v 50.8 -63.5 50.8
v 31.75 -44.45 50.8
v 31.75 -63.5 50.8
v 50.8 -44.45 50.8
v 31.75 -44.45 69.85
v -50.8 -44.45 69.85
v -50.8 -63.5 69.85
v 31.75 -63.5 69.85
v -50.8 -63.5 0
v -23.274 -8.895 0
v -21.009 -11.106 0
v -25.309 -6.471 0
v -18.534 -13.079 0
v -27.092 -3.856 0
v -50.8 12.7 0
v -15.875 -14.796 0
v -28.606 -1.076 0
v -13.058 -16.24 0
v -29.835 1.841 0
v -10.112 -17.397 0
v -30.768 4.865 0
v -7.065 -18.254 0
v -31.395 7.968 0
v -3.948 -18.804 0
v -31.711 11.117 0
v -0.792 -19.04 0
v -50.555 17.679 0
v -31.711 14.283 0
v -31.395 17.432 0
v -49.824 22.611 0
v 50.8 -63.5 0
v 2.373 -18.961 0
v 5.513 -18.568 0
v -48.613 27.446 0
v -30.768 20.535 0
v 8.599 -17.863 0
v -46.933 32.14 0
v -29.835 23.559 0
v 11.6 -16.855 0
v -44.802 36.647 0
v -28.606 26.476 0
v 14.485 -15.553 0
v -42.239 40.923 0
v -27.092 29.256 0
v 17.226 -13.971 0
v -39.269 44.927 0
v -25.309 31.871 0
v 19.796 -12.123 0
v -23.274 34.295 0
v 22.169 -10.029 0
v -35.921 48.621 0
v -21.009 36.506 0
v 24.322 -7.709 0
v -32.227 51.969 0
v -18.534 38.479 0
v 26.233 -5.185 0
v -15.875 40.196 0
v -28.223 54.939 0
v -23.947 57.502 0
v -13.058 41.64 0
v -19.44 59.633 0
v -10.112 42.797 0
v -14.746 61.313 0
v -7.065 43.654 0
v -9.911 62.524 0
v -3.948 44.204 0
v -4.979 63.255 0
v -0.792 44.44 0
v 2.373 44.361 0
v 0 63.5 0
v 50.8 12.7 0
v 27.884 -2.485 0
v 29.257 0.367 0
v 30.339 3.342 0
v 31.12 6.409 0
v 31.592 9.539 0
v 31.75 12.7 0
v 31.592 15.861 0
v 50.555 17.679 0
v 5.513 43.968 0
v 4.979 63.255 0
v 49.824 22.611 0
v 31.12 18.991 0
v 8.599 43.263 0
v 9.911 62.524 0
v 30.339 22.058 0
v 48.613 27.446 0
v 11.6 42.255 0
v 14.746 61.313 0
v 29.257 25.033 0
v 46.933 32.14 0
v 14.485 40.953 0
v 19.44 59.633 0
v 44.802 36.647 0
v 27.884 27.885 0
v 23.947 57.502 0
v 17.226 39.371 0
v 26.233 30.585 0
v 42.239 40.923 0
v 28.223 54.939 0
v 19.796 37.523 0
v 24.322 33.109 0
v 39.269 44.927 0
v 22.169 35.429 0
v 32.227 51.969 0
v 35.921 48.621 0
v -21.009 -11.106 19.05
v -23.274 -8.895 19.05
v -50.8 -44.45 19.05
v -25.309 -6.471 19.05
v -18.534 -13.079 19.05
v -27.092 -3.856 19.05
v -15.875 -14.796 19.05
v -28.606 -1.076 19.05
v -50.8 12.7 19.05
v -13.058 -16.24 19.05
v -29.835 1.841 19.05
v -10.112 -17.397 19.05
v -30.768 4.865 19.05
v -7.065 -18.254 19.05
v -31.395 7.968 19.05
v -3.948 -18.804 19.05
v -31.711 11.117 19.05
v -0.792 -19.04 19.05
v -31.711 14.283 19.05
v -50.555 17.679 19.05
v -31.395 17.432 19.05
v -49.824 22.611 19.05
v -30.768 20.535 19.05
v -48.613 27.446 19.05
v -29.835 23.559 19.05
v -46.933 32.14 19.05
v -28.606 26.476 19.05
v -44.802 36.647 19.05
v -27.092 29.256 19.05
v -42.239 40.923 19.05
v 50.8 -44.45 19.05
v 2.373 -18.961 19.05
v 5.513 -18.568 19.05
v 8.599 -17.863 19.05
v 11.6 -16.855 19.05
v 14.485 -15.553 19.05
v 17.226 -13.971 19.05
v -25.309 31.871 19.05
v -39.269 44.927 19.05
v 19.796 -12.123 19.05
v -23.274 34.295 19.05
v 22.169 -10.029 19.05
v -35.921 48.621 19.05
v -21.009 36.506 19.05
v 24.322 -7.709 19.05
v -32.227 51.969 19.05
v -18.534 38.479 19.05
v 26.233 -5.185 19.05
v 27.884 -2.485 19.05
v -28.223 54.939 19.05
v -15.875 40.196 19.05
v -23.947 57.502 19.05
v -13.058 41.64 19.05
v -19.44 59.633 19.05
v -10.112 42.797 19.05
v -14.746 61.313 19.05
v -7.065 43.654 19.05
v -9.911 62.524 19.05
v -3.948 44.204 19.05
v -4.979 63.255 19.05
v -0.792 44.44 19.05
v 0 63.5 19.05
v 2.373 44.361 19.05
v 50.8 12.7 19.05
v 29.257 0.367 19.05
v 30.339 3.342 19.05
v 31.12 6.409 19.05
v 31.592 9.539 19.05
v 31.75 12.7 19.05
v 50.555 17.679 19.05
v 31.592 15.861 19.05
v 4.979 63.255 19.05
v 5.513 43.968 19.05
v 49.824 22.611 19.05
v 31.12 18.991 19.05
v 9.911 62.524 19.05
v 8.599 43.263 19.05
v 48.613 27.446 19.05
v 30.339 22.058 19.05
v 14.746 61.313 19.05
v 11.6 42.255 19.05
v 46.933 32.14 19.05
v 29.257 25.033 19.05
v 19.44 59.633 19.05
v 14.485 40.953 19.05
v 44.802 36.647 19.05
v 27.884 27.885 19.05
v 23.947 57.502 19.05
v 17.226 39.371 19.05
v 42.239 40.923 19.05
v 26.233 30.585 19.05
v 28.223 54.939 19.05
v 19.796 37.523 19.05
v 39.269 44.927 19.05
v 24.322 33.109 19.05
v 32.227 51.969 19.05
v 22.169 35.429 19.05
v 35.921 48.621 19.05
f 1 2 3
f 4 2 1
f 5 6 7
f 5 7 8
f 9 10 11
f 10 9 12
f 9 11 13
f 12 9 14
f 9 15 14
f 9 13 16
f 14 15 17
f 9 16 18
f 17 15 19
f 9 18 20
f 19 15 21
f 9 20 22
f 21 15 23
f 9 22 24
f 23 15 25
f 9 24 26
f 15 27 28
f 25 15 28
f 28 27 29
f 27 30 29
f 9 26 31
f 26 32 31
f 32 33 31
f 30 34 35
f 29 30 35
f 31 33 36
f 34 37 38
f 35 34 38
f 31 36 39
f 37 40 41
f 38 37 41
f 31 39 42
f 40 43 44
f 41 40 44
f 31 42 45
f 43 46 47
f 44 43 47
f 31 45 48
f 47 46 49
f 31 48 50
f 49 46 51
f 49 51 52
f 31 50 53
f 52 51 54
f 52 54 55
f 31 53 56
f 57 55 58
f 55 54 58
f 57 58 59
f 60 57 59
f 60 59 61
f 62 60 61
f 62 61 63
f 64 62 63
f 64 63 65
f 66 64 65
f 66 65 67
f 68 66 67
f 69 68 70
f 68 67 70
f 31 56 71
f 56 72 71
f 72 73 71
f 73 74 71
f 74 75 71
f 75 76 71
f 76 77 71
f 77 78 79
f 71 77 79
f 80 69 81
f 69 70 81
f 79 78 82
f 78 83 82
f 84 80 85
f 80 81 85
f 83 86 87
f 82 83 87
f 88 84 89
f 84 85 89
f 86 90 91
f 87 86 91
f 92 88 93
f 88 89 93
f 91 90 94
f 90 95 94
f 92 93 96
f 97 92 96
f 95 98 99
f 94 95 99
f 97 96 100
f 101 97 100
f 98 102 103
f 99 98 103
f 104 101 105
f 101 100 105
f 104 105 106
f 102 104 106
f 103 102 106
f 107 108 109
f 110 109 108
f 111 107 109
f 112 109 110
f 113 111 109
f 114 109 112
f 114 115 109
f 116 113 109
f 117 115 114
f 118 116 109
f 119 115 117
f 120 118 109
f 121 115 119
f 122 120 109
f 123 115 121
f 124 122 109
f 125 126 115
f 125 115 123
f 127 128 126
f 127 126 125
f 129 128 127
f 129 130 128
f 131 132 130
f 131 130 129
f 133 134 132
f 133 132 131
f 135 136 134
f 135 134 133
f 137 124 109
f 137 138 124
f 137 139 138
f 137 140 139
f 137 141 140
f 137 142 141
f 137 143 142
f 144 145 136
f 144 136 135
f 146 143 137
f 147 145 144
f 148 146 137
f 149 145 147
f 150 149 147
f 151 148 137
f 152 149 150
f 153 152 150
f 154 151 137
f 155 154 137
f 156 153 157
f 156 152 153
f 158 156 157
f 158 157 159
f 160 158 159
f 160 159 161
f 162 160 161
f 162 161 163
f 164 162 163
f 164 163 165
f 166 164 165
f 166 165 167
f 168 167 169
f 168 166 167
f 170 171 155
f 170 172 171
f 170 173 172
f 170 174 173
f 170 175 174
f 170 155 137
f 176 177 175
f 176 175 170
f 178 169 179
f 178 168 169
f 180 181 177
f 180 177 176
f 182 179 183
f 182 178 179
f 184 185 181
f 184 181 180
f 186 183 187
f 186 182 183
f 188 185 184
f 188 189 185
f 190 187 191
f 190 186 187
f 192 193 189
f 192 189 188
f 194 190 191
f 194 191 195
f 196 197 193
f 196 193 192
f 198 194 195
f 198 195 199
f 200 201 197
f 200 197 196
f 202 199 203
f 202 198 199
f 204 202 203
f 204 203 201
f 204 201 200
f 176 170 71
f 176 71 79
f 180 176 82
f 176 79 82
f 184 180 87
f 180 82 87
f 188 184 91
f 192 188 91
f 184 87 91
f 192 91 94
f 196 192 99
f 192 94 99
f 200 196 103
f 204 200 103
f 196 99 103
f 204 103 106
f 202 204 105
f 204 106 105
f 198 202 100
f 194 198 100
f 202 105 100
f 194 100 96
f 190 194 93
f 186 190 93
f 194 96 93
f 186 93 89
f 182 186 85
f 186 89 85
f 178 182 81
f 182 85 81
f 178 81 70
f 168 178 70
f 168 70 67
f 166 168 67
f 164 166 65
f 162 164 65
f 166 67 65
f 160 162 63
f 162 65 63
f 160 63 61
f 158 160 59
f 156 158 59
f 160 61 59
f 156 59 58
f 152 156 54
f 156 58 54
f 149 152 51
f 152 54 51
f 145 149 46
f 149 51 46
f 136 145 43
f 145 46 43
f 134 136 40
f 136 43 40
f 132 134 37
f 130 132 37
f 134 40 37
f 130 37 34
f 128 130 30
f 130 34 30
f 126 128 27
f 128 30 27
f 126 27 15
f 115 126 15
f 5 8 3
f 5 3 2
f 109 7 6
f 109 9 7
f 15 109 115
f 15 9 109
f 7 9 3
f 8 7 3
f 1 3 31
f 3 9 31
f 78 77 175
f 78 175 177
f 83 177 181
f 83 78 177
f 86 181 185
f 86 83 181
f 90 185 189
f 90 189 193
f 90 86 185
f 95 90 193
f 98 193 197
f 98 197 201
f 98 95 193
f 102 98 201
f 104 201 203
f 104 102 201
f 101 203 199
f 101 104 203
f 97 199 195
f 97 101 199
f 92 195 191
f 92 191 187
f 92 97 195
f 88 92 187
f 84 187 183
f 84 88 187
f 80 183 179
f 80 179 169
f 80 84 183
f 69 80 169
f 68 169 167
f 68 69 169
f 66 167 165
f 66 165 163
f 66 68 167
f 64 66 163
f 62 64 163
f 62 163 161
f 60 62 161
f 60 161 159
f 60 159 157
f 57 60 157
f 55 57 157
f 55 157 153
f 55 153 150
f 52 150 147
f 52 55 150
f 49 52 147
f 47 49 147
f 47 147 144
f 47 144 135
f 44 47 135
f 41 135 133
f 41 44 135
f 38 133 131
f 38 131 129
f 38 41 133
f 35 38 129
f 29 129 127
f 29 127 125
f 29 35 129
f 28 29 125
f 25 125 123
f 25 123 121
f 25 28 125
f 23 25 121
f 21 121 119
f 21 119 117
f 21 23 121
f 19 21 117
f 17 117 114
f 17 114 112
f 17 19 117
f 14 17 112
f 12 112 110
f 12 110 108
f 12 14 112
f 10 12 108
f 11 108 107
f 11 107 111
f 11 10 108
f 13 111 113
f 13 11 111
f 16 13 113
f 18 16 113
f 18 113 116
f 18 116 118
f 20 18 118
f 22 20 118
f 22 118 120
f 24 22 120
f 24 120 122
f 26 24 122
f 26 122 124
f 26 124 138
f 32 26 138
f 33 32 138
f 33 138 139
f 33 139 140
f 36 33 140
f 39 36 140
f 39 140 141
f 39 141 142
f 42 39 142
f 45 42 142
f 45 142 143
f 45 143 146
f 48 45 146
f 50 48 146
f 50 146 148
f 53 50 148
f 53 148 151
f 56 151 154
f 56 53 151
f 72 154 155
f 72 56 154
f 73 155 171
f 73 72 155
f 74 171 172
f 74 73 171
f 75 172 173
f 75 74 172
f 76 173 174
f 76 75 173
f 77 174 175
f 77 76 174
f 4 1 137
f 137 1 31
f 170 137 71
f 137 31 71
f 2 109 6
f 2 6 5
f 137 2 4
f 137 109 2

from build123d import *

# Parameters (mm, degrees)
F0_R     = 31.75
F1_DEPTH = 19.05
F2_W     = 101.6
F2_H     = 19.05
F3_DEPTH = 50.8
F4_W     = 19.05
F4_H     = 19.05
F5_DEPTH = 19.05


with BuildPart() as f1:
    # F0 (on Top) → F1 (new body)
    with BuildSketch(Plane.XY):
        with BuildLine():
            ThreePointArc((50.8, 12.7), (35.921024, 48.621024), (0, 63.5))
            ThreePointArc((0, 63.5), (-35.921024, 48.621024), (-50.8, 12.7))
            Line((-50.8, 12.7), (-50.8, -63.5))
            Line((-50.8, -63.5), (50.8, -63.5))
            Line((50.8, -63.5), (50.8, 12.7))
        make_face()
        with Locations((0, 12.7)):
            Circle(F0_R, mode=Mode.SUBTRACT)
    extrude(amount=F1_DEPTH)

    # F2 (on face) → F3 (join)
    with BuildSketch(Plane.XY.offset(19.05)):
        with Locations((0, -53.975)):
            Rectangle(F2_W, F2_H)
    extrude(amount=F3_DEPTH)

    # F4 (on face) → F5 (cut)
    with BuildSketch(Plane.XY.offset(69.85)):
        with Locations((41.275, -53.975)):
            Rectangle(F4_W, F4_H)
    extrude(amount=-F5_DEPTH, mode=Mode.SUBTRACT)


solid = f1.part
